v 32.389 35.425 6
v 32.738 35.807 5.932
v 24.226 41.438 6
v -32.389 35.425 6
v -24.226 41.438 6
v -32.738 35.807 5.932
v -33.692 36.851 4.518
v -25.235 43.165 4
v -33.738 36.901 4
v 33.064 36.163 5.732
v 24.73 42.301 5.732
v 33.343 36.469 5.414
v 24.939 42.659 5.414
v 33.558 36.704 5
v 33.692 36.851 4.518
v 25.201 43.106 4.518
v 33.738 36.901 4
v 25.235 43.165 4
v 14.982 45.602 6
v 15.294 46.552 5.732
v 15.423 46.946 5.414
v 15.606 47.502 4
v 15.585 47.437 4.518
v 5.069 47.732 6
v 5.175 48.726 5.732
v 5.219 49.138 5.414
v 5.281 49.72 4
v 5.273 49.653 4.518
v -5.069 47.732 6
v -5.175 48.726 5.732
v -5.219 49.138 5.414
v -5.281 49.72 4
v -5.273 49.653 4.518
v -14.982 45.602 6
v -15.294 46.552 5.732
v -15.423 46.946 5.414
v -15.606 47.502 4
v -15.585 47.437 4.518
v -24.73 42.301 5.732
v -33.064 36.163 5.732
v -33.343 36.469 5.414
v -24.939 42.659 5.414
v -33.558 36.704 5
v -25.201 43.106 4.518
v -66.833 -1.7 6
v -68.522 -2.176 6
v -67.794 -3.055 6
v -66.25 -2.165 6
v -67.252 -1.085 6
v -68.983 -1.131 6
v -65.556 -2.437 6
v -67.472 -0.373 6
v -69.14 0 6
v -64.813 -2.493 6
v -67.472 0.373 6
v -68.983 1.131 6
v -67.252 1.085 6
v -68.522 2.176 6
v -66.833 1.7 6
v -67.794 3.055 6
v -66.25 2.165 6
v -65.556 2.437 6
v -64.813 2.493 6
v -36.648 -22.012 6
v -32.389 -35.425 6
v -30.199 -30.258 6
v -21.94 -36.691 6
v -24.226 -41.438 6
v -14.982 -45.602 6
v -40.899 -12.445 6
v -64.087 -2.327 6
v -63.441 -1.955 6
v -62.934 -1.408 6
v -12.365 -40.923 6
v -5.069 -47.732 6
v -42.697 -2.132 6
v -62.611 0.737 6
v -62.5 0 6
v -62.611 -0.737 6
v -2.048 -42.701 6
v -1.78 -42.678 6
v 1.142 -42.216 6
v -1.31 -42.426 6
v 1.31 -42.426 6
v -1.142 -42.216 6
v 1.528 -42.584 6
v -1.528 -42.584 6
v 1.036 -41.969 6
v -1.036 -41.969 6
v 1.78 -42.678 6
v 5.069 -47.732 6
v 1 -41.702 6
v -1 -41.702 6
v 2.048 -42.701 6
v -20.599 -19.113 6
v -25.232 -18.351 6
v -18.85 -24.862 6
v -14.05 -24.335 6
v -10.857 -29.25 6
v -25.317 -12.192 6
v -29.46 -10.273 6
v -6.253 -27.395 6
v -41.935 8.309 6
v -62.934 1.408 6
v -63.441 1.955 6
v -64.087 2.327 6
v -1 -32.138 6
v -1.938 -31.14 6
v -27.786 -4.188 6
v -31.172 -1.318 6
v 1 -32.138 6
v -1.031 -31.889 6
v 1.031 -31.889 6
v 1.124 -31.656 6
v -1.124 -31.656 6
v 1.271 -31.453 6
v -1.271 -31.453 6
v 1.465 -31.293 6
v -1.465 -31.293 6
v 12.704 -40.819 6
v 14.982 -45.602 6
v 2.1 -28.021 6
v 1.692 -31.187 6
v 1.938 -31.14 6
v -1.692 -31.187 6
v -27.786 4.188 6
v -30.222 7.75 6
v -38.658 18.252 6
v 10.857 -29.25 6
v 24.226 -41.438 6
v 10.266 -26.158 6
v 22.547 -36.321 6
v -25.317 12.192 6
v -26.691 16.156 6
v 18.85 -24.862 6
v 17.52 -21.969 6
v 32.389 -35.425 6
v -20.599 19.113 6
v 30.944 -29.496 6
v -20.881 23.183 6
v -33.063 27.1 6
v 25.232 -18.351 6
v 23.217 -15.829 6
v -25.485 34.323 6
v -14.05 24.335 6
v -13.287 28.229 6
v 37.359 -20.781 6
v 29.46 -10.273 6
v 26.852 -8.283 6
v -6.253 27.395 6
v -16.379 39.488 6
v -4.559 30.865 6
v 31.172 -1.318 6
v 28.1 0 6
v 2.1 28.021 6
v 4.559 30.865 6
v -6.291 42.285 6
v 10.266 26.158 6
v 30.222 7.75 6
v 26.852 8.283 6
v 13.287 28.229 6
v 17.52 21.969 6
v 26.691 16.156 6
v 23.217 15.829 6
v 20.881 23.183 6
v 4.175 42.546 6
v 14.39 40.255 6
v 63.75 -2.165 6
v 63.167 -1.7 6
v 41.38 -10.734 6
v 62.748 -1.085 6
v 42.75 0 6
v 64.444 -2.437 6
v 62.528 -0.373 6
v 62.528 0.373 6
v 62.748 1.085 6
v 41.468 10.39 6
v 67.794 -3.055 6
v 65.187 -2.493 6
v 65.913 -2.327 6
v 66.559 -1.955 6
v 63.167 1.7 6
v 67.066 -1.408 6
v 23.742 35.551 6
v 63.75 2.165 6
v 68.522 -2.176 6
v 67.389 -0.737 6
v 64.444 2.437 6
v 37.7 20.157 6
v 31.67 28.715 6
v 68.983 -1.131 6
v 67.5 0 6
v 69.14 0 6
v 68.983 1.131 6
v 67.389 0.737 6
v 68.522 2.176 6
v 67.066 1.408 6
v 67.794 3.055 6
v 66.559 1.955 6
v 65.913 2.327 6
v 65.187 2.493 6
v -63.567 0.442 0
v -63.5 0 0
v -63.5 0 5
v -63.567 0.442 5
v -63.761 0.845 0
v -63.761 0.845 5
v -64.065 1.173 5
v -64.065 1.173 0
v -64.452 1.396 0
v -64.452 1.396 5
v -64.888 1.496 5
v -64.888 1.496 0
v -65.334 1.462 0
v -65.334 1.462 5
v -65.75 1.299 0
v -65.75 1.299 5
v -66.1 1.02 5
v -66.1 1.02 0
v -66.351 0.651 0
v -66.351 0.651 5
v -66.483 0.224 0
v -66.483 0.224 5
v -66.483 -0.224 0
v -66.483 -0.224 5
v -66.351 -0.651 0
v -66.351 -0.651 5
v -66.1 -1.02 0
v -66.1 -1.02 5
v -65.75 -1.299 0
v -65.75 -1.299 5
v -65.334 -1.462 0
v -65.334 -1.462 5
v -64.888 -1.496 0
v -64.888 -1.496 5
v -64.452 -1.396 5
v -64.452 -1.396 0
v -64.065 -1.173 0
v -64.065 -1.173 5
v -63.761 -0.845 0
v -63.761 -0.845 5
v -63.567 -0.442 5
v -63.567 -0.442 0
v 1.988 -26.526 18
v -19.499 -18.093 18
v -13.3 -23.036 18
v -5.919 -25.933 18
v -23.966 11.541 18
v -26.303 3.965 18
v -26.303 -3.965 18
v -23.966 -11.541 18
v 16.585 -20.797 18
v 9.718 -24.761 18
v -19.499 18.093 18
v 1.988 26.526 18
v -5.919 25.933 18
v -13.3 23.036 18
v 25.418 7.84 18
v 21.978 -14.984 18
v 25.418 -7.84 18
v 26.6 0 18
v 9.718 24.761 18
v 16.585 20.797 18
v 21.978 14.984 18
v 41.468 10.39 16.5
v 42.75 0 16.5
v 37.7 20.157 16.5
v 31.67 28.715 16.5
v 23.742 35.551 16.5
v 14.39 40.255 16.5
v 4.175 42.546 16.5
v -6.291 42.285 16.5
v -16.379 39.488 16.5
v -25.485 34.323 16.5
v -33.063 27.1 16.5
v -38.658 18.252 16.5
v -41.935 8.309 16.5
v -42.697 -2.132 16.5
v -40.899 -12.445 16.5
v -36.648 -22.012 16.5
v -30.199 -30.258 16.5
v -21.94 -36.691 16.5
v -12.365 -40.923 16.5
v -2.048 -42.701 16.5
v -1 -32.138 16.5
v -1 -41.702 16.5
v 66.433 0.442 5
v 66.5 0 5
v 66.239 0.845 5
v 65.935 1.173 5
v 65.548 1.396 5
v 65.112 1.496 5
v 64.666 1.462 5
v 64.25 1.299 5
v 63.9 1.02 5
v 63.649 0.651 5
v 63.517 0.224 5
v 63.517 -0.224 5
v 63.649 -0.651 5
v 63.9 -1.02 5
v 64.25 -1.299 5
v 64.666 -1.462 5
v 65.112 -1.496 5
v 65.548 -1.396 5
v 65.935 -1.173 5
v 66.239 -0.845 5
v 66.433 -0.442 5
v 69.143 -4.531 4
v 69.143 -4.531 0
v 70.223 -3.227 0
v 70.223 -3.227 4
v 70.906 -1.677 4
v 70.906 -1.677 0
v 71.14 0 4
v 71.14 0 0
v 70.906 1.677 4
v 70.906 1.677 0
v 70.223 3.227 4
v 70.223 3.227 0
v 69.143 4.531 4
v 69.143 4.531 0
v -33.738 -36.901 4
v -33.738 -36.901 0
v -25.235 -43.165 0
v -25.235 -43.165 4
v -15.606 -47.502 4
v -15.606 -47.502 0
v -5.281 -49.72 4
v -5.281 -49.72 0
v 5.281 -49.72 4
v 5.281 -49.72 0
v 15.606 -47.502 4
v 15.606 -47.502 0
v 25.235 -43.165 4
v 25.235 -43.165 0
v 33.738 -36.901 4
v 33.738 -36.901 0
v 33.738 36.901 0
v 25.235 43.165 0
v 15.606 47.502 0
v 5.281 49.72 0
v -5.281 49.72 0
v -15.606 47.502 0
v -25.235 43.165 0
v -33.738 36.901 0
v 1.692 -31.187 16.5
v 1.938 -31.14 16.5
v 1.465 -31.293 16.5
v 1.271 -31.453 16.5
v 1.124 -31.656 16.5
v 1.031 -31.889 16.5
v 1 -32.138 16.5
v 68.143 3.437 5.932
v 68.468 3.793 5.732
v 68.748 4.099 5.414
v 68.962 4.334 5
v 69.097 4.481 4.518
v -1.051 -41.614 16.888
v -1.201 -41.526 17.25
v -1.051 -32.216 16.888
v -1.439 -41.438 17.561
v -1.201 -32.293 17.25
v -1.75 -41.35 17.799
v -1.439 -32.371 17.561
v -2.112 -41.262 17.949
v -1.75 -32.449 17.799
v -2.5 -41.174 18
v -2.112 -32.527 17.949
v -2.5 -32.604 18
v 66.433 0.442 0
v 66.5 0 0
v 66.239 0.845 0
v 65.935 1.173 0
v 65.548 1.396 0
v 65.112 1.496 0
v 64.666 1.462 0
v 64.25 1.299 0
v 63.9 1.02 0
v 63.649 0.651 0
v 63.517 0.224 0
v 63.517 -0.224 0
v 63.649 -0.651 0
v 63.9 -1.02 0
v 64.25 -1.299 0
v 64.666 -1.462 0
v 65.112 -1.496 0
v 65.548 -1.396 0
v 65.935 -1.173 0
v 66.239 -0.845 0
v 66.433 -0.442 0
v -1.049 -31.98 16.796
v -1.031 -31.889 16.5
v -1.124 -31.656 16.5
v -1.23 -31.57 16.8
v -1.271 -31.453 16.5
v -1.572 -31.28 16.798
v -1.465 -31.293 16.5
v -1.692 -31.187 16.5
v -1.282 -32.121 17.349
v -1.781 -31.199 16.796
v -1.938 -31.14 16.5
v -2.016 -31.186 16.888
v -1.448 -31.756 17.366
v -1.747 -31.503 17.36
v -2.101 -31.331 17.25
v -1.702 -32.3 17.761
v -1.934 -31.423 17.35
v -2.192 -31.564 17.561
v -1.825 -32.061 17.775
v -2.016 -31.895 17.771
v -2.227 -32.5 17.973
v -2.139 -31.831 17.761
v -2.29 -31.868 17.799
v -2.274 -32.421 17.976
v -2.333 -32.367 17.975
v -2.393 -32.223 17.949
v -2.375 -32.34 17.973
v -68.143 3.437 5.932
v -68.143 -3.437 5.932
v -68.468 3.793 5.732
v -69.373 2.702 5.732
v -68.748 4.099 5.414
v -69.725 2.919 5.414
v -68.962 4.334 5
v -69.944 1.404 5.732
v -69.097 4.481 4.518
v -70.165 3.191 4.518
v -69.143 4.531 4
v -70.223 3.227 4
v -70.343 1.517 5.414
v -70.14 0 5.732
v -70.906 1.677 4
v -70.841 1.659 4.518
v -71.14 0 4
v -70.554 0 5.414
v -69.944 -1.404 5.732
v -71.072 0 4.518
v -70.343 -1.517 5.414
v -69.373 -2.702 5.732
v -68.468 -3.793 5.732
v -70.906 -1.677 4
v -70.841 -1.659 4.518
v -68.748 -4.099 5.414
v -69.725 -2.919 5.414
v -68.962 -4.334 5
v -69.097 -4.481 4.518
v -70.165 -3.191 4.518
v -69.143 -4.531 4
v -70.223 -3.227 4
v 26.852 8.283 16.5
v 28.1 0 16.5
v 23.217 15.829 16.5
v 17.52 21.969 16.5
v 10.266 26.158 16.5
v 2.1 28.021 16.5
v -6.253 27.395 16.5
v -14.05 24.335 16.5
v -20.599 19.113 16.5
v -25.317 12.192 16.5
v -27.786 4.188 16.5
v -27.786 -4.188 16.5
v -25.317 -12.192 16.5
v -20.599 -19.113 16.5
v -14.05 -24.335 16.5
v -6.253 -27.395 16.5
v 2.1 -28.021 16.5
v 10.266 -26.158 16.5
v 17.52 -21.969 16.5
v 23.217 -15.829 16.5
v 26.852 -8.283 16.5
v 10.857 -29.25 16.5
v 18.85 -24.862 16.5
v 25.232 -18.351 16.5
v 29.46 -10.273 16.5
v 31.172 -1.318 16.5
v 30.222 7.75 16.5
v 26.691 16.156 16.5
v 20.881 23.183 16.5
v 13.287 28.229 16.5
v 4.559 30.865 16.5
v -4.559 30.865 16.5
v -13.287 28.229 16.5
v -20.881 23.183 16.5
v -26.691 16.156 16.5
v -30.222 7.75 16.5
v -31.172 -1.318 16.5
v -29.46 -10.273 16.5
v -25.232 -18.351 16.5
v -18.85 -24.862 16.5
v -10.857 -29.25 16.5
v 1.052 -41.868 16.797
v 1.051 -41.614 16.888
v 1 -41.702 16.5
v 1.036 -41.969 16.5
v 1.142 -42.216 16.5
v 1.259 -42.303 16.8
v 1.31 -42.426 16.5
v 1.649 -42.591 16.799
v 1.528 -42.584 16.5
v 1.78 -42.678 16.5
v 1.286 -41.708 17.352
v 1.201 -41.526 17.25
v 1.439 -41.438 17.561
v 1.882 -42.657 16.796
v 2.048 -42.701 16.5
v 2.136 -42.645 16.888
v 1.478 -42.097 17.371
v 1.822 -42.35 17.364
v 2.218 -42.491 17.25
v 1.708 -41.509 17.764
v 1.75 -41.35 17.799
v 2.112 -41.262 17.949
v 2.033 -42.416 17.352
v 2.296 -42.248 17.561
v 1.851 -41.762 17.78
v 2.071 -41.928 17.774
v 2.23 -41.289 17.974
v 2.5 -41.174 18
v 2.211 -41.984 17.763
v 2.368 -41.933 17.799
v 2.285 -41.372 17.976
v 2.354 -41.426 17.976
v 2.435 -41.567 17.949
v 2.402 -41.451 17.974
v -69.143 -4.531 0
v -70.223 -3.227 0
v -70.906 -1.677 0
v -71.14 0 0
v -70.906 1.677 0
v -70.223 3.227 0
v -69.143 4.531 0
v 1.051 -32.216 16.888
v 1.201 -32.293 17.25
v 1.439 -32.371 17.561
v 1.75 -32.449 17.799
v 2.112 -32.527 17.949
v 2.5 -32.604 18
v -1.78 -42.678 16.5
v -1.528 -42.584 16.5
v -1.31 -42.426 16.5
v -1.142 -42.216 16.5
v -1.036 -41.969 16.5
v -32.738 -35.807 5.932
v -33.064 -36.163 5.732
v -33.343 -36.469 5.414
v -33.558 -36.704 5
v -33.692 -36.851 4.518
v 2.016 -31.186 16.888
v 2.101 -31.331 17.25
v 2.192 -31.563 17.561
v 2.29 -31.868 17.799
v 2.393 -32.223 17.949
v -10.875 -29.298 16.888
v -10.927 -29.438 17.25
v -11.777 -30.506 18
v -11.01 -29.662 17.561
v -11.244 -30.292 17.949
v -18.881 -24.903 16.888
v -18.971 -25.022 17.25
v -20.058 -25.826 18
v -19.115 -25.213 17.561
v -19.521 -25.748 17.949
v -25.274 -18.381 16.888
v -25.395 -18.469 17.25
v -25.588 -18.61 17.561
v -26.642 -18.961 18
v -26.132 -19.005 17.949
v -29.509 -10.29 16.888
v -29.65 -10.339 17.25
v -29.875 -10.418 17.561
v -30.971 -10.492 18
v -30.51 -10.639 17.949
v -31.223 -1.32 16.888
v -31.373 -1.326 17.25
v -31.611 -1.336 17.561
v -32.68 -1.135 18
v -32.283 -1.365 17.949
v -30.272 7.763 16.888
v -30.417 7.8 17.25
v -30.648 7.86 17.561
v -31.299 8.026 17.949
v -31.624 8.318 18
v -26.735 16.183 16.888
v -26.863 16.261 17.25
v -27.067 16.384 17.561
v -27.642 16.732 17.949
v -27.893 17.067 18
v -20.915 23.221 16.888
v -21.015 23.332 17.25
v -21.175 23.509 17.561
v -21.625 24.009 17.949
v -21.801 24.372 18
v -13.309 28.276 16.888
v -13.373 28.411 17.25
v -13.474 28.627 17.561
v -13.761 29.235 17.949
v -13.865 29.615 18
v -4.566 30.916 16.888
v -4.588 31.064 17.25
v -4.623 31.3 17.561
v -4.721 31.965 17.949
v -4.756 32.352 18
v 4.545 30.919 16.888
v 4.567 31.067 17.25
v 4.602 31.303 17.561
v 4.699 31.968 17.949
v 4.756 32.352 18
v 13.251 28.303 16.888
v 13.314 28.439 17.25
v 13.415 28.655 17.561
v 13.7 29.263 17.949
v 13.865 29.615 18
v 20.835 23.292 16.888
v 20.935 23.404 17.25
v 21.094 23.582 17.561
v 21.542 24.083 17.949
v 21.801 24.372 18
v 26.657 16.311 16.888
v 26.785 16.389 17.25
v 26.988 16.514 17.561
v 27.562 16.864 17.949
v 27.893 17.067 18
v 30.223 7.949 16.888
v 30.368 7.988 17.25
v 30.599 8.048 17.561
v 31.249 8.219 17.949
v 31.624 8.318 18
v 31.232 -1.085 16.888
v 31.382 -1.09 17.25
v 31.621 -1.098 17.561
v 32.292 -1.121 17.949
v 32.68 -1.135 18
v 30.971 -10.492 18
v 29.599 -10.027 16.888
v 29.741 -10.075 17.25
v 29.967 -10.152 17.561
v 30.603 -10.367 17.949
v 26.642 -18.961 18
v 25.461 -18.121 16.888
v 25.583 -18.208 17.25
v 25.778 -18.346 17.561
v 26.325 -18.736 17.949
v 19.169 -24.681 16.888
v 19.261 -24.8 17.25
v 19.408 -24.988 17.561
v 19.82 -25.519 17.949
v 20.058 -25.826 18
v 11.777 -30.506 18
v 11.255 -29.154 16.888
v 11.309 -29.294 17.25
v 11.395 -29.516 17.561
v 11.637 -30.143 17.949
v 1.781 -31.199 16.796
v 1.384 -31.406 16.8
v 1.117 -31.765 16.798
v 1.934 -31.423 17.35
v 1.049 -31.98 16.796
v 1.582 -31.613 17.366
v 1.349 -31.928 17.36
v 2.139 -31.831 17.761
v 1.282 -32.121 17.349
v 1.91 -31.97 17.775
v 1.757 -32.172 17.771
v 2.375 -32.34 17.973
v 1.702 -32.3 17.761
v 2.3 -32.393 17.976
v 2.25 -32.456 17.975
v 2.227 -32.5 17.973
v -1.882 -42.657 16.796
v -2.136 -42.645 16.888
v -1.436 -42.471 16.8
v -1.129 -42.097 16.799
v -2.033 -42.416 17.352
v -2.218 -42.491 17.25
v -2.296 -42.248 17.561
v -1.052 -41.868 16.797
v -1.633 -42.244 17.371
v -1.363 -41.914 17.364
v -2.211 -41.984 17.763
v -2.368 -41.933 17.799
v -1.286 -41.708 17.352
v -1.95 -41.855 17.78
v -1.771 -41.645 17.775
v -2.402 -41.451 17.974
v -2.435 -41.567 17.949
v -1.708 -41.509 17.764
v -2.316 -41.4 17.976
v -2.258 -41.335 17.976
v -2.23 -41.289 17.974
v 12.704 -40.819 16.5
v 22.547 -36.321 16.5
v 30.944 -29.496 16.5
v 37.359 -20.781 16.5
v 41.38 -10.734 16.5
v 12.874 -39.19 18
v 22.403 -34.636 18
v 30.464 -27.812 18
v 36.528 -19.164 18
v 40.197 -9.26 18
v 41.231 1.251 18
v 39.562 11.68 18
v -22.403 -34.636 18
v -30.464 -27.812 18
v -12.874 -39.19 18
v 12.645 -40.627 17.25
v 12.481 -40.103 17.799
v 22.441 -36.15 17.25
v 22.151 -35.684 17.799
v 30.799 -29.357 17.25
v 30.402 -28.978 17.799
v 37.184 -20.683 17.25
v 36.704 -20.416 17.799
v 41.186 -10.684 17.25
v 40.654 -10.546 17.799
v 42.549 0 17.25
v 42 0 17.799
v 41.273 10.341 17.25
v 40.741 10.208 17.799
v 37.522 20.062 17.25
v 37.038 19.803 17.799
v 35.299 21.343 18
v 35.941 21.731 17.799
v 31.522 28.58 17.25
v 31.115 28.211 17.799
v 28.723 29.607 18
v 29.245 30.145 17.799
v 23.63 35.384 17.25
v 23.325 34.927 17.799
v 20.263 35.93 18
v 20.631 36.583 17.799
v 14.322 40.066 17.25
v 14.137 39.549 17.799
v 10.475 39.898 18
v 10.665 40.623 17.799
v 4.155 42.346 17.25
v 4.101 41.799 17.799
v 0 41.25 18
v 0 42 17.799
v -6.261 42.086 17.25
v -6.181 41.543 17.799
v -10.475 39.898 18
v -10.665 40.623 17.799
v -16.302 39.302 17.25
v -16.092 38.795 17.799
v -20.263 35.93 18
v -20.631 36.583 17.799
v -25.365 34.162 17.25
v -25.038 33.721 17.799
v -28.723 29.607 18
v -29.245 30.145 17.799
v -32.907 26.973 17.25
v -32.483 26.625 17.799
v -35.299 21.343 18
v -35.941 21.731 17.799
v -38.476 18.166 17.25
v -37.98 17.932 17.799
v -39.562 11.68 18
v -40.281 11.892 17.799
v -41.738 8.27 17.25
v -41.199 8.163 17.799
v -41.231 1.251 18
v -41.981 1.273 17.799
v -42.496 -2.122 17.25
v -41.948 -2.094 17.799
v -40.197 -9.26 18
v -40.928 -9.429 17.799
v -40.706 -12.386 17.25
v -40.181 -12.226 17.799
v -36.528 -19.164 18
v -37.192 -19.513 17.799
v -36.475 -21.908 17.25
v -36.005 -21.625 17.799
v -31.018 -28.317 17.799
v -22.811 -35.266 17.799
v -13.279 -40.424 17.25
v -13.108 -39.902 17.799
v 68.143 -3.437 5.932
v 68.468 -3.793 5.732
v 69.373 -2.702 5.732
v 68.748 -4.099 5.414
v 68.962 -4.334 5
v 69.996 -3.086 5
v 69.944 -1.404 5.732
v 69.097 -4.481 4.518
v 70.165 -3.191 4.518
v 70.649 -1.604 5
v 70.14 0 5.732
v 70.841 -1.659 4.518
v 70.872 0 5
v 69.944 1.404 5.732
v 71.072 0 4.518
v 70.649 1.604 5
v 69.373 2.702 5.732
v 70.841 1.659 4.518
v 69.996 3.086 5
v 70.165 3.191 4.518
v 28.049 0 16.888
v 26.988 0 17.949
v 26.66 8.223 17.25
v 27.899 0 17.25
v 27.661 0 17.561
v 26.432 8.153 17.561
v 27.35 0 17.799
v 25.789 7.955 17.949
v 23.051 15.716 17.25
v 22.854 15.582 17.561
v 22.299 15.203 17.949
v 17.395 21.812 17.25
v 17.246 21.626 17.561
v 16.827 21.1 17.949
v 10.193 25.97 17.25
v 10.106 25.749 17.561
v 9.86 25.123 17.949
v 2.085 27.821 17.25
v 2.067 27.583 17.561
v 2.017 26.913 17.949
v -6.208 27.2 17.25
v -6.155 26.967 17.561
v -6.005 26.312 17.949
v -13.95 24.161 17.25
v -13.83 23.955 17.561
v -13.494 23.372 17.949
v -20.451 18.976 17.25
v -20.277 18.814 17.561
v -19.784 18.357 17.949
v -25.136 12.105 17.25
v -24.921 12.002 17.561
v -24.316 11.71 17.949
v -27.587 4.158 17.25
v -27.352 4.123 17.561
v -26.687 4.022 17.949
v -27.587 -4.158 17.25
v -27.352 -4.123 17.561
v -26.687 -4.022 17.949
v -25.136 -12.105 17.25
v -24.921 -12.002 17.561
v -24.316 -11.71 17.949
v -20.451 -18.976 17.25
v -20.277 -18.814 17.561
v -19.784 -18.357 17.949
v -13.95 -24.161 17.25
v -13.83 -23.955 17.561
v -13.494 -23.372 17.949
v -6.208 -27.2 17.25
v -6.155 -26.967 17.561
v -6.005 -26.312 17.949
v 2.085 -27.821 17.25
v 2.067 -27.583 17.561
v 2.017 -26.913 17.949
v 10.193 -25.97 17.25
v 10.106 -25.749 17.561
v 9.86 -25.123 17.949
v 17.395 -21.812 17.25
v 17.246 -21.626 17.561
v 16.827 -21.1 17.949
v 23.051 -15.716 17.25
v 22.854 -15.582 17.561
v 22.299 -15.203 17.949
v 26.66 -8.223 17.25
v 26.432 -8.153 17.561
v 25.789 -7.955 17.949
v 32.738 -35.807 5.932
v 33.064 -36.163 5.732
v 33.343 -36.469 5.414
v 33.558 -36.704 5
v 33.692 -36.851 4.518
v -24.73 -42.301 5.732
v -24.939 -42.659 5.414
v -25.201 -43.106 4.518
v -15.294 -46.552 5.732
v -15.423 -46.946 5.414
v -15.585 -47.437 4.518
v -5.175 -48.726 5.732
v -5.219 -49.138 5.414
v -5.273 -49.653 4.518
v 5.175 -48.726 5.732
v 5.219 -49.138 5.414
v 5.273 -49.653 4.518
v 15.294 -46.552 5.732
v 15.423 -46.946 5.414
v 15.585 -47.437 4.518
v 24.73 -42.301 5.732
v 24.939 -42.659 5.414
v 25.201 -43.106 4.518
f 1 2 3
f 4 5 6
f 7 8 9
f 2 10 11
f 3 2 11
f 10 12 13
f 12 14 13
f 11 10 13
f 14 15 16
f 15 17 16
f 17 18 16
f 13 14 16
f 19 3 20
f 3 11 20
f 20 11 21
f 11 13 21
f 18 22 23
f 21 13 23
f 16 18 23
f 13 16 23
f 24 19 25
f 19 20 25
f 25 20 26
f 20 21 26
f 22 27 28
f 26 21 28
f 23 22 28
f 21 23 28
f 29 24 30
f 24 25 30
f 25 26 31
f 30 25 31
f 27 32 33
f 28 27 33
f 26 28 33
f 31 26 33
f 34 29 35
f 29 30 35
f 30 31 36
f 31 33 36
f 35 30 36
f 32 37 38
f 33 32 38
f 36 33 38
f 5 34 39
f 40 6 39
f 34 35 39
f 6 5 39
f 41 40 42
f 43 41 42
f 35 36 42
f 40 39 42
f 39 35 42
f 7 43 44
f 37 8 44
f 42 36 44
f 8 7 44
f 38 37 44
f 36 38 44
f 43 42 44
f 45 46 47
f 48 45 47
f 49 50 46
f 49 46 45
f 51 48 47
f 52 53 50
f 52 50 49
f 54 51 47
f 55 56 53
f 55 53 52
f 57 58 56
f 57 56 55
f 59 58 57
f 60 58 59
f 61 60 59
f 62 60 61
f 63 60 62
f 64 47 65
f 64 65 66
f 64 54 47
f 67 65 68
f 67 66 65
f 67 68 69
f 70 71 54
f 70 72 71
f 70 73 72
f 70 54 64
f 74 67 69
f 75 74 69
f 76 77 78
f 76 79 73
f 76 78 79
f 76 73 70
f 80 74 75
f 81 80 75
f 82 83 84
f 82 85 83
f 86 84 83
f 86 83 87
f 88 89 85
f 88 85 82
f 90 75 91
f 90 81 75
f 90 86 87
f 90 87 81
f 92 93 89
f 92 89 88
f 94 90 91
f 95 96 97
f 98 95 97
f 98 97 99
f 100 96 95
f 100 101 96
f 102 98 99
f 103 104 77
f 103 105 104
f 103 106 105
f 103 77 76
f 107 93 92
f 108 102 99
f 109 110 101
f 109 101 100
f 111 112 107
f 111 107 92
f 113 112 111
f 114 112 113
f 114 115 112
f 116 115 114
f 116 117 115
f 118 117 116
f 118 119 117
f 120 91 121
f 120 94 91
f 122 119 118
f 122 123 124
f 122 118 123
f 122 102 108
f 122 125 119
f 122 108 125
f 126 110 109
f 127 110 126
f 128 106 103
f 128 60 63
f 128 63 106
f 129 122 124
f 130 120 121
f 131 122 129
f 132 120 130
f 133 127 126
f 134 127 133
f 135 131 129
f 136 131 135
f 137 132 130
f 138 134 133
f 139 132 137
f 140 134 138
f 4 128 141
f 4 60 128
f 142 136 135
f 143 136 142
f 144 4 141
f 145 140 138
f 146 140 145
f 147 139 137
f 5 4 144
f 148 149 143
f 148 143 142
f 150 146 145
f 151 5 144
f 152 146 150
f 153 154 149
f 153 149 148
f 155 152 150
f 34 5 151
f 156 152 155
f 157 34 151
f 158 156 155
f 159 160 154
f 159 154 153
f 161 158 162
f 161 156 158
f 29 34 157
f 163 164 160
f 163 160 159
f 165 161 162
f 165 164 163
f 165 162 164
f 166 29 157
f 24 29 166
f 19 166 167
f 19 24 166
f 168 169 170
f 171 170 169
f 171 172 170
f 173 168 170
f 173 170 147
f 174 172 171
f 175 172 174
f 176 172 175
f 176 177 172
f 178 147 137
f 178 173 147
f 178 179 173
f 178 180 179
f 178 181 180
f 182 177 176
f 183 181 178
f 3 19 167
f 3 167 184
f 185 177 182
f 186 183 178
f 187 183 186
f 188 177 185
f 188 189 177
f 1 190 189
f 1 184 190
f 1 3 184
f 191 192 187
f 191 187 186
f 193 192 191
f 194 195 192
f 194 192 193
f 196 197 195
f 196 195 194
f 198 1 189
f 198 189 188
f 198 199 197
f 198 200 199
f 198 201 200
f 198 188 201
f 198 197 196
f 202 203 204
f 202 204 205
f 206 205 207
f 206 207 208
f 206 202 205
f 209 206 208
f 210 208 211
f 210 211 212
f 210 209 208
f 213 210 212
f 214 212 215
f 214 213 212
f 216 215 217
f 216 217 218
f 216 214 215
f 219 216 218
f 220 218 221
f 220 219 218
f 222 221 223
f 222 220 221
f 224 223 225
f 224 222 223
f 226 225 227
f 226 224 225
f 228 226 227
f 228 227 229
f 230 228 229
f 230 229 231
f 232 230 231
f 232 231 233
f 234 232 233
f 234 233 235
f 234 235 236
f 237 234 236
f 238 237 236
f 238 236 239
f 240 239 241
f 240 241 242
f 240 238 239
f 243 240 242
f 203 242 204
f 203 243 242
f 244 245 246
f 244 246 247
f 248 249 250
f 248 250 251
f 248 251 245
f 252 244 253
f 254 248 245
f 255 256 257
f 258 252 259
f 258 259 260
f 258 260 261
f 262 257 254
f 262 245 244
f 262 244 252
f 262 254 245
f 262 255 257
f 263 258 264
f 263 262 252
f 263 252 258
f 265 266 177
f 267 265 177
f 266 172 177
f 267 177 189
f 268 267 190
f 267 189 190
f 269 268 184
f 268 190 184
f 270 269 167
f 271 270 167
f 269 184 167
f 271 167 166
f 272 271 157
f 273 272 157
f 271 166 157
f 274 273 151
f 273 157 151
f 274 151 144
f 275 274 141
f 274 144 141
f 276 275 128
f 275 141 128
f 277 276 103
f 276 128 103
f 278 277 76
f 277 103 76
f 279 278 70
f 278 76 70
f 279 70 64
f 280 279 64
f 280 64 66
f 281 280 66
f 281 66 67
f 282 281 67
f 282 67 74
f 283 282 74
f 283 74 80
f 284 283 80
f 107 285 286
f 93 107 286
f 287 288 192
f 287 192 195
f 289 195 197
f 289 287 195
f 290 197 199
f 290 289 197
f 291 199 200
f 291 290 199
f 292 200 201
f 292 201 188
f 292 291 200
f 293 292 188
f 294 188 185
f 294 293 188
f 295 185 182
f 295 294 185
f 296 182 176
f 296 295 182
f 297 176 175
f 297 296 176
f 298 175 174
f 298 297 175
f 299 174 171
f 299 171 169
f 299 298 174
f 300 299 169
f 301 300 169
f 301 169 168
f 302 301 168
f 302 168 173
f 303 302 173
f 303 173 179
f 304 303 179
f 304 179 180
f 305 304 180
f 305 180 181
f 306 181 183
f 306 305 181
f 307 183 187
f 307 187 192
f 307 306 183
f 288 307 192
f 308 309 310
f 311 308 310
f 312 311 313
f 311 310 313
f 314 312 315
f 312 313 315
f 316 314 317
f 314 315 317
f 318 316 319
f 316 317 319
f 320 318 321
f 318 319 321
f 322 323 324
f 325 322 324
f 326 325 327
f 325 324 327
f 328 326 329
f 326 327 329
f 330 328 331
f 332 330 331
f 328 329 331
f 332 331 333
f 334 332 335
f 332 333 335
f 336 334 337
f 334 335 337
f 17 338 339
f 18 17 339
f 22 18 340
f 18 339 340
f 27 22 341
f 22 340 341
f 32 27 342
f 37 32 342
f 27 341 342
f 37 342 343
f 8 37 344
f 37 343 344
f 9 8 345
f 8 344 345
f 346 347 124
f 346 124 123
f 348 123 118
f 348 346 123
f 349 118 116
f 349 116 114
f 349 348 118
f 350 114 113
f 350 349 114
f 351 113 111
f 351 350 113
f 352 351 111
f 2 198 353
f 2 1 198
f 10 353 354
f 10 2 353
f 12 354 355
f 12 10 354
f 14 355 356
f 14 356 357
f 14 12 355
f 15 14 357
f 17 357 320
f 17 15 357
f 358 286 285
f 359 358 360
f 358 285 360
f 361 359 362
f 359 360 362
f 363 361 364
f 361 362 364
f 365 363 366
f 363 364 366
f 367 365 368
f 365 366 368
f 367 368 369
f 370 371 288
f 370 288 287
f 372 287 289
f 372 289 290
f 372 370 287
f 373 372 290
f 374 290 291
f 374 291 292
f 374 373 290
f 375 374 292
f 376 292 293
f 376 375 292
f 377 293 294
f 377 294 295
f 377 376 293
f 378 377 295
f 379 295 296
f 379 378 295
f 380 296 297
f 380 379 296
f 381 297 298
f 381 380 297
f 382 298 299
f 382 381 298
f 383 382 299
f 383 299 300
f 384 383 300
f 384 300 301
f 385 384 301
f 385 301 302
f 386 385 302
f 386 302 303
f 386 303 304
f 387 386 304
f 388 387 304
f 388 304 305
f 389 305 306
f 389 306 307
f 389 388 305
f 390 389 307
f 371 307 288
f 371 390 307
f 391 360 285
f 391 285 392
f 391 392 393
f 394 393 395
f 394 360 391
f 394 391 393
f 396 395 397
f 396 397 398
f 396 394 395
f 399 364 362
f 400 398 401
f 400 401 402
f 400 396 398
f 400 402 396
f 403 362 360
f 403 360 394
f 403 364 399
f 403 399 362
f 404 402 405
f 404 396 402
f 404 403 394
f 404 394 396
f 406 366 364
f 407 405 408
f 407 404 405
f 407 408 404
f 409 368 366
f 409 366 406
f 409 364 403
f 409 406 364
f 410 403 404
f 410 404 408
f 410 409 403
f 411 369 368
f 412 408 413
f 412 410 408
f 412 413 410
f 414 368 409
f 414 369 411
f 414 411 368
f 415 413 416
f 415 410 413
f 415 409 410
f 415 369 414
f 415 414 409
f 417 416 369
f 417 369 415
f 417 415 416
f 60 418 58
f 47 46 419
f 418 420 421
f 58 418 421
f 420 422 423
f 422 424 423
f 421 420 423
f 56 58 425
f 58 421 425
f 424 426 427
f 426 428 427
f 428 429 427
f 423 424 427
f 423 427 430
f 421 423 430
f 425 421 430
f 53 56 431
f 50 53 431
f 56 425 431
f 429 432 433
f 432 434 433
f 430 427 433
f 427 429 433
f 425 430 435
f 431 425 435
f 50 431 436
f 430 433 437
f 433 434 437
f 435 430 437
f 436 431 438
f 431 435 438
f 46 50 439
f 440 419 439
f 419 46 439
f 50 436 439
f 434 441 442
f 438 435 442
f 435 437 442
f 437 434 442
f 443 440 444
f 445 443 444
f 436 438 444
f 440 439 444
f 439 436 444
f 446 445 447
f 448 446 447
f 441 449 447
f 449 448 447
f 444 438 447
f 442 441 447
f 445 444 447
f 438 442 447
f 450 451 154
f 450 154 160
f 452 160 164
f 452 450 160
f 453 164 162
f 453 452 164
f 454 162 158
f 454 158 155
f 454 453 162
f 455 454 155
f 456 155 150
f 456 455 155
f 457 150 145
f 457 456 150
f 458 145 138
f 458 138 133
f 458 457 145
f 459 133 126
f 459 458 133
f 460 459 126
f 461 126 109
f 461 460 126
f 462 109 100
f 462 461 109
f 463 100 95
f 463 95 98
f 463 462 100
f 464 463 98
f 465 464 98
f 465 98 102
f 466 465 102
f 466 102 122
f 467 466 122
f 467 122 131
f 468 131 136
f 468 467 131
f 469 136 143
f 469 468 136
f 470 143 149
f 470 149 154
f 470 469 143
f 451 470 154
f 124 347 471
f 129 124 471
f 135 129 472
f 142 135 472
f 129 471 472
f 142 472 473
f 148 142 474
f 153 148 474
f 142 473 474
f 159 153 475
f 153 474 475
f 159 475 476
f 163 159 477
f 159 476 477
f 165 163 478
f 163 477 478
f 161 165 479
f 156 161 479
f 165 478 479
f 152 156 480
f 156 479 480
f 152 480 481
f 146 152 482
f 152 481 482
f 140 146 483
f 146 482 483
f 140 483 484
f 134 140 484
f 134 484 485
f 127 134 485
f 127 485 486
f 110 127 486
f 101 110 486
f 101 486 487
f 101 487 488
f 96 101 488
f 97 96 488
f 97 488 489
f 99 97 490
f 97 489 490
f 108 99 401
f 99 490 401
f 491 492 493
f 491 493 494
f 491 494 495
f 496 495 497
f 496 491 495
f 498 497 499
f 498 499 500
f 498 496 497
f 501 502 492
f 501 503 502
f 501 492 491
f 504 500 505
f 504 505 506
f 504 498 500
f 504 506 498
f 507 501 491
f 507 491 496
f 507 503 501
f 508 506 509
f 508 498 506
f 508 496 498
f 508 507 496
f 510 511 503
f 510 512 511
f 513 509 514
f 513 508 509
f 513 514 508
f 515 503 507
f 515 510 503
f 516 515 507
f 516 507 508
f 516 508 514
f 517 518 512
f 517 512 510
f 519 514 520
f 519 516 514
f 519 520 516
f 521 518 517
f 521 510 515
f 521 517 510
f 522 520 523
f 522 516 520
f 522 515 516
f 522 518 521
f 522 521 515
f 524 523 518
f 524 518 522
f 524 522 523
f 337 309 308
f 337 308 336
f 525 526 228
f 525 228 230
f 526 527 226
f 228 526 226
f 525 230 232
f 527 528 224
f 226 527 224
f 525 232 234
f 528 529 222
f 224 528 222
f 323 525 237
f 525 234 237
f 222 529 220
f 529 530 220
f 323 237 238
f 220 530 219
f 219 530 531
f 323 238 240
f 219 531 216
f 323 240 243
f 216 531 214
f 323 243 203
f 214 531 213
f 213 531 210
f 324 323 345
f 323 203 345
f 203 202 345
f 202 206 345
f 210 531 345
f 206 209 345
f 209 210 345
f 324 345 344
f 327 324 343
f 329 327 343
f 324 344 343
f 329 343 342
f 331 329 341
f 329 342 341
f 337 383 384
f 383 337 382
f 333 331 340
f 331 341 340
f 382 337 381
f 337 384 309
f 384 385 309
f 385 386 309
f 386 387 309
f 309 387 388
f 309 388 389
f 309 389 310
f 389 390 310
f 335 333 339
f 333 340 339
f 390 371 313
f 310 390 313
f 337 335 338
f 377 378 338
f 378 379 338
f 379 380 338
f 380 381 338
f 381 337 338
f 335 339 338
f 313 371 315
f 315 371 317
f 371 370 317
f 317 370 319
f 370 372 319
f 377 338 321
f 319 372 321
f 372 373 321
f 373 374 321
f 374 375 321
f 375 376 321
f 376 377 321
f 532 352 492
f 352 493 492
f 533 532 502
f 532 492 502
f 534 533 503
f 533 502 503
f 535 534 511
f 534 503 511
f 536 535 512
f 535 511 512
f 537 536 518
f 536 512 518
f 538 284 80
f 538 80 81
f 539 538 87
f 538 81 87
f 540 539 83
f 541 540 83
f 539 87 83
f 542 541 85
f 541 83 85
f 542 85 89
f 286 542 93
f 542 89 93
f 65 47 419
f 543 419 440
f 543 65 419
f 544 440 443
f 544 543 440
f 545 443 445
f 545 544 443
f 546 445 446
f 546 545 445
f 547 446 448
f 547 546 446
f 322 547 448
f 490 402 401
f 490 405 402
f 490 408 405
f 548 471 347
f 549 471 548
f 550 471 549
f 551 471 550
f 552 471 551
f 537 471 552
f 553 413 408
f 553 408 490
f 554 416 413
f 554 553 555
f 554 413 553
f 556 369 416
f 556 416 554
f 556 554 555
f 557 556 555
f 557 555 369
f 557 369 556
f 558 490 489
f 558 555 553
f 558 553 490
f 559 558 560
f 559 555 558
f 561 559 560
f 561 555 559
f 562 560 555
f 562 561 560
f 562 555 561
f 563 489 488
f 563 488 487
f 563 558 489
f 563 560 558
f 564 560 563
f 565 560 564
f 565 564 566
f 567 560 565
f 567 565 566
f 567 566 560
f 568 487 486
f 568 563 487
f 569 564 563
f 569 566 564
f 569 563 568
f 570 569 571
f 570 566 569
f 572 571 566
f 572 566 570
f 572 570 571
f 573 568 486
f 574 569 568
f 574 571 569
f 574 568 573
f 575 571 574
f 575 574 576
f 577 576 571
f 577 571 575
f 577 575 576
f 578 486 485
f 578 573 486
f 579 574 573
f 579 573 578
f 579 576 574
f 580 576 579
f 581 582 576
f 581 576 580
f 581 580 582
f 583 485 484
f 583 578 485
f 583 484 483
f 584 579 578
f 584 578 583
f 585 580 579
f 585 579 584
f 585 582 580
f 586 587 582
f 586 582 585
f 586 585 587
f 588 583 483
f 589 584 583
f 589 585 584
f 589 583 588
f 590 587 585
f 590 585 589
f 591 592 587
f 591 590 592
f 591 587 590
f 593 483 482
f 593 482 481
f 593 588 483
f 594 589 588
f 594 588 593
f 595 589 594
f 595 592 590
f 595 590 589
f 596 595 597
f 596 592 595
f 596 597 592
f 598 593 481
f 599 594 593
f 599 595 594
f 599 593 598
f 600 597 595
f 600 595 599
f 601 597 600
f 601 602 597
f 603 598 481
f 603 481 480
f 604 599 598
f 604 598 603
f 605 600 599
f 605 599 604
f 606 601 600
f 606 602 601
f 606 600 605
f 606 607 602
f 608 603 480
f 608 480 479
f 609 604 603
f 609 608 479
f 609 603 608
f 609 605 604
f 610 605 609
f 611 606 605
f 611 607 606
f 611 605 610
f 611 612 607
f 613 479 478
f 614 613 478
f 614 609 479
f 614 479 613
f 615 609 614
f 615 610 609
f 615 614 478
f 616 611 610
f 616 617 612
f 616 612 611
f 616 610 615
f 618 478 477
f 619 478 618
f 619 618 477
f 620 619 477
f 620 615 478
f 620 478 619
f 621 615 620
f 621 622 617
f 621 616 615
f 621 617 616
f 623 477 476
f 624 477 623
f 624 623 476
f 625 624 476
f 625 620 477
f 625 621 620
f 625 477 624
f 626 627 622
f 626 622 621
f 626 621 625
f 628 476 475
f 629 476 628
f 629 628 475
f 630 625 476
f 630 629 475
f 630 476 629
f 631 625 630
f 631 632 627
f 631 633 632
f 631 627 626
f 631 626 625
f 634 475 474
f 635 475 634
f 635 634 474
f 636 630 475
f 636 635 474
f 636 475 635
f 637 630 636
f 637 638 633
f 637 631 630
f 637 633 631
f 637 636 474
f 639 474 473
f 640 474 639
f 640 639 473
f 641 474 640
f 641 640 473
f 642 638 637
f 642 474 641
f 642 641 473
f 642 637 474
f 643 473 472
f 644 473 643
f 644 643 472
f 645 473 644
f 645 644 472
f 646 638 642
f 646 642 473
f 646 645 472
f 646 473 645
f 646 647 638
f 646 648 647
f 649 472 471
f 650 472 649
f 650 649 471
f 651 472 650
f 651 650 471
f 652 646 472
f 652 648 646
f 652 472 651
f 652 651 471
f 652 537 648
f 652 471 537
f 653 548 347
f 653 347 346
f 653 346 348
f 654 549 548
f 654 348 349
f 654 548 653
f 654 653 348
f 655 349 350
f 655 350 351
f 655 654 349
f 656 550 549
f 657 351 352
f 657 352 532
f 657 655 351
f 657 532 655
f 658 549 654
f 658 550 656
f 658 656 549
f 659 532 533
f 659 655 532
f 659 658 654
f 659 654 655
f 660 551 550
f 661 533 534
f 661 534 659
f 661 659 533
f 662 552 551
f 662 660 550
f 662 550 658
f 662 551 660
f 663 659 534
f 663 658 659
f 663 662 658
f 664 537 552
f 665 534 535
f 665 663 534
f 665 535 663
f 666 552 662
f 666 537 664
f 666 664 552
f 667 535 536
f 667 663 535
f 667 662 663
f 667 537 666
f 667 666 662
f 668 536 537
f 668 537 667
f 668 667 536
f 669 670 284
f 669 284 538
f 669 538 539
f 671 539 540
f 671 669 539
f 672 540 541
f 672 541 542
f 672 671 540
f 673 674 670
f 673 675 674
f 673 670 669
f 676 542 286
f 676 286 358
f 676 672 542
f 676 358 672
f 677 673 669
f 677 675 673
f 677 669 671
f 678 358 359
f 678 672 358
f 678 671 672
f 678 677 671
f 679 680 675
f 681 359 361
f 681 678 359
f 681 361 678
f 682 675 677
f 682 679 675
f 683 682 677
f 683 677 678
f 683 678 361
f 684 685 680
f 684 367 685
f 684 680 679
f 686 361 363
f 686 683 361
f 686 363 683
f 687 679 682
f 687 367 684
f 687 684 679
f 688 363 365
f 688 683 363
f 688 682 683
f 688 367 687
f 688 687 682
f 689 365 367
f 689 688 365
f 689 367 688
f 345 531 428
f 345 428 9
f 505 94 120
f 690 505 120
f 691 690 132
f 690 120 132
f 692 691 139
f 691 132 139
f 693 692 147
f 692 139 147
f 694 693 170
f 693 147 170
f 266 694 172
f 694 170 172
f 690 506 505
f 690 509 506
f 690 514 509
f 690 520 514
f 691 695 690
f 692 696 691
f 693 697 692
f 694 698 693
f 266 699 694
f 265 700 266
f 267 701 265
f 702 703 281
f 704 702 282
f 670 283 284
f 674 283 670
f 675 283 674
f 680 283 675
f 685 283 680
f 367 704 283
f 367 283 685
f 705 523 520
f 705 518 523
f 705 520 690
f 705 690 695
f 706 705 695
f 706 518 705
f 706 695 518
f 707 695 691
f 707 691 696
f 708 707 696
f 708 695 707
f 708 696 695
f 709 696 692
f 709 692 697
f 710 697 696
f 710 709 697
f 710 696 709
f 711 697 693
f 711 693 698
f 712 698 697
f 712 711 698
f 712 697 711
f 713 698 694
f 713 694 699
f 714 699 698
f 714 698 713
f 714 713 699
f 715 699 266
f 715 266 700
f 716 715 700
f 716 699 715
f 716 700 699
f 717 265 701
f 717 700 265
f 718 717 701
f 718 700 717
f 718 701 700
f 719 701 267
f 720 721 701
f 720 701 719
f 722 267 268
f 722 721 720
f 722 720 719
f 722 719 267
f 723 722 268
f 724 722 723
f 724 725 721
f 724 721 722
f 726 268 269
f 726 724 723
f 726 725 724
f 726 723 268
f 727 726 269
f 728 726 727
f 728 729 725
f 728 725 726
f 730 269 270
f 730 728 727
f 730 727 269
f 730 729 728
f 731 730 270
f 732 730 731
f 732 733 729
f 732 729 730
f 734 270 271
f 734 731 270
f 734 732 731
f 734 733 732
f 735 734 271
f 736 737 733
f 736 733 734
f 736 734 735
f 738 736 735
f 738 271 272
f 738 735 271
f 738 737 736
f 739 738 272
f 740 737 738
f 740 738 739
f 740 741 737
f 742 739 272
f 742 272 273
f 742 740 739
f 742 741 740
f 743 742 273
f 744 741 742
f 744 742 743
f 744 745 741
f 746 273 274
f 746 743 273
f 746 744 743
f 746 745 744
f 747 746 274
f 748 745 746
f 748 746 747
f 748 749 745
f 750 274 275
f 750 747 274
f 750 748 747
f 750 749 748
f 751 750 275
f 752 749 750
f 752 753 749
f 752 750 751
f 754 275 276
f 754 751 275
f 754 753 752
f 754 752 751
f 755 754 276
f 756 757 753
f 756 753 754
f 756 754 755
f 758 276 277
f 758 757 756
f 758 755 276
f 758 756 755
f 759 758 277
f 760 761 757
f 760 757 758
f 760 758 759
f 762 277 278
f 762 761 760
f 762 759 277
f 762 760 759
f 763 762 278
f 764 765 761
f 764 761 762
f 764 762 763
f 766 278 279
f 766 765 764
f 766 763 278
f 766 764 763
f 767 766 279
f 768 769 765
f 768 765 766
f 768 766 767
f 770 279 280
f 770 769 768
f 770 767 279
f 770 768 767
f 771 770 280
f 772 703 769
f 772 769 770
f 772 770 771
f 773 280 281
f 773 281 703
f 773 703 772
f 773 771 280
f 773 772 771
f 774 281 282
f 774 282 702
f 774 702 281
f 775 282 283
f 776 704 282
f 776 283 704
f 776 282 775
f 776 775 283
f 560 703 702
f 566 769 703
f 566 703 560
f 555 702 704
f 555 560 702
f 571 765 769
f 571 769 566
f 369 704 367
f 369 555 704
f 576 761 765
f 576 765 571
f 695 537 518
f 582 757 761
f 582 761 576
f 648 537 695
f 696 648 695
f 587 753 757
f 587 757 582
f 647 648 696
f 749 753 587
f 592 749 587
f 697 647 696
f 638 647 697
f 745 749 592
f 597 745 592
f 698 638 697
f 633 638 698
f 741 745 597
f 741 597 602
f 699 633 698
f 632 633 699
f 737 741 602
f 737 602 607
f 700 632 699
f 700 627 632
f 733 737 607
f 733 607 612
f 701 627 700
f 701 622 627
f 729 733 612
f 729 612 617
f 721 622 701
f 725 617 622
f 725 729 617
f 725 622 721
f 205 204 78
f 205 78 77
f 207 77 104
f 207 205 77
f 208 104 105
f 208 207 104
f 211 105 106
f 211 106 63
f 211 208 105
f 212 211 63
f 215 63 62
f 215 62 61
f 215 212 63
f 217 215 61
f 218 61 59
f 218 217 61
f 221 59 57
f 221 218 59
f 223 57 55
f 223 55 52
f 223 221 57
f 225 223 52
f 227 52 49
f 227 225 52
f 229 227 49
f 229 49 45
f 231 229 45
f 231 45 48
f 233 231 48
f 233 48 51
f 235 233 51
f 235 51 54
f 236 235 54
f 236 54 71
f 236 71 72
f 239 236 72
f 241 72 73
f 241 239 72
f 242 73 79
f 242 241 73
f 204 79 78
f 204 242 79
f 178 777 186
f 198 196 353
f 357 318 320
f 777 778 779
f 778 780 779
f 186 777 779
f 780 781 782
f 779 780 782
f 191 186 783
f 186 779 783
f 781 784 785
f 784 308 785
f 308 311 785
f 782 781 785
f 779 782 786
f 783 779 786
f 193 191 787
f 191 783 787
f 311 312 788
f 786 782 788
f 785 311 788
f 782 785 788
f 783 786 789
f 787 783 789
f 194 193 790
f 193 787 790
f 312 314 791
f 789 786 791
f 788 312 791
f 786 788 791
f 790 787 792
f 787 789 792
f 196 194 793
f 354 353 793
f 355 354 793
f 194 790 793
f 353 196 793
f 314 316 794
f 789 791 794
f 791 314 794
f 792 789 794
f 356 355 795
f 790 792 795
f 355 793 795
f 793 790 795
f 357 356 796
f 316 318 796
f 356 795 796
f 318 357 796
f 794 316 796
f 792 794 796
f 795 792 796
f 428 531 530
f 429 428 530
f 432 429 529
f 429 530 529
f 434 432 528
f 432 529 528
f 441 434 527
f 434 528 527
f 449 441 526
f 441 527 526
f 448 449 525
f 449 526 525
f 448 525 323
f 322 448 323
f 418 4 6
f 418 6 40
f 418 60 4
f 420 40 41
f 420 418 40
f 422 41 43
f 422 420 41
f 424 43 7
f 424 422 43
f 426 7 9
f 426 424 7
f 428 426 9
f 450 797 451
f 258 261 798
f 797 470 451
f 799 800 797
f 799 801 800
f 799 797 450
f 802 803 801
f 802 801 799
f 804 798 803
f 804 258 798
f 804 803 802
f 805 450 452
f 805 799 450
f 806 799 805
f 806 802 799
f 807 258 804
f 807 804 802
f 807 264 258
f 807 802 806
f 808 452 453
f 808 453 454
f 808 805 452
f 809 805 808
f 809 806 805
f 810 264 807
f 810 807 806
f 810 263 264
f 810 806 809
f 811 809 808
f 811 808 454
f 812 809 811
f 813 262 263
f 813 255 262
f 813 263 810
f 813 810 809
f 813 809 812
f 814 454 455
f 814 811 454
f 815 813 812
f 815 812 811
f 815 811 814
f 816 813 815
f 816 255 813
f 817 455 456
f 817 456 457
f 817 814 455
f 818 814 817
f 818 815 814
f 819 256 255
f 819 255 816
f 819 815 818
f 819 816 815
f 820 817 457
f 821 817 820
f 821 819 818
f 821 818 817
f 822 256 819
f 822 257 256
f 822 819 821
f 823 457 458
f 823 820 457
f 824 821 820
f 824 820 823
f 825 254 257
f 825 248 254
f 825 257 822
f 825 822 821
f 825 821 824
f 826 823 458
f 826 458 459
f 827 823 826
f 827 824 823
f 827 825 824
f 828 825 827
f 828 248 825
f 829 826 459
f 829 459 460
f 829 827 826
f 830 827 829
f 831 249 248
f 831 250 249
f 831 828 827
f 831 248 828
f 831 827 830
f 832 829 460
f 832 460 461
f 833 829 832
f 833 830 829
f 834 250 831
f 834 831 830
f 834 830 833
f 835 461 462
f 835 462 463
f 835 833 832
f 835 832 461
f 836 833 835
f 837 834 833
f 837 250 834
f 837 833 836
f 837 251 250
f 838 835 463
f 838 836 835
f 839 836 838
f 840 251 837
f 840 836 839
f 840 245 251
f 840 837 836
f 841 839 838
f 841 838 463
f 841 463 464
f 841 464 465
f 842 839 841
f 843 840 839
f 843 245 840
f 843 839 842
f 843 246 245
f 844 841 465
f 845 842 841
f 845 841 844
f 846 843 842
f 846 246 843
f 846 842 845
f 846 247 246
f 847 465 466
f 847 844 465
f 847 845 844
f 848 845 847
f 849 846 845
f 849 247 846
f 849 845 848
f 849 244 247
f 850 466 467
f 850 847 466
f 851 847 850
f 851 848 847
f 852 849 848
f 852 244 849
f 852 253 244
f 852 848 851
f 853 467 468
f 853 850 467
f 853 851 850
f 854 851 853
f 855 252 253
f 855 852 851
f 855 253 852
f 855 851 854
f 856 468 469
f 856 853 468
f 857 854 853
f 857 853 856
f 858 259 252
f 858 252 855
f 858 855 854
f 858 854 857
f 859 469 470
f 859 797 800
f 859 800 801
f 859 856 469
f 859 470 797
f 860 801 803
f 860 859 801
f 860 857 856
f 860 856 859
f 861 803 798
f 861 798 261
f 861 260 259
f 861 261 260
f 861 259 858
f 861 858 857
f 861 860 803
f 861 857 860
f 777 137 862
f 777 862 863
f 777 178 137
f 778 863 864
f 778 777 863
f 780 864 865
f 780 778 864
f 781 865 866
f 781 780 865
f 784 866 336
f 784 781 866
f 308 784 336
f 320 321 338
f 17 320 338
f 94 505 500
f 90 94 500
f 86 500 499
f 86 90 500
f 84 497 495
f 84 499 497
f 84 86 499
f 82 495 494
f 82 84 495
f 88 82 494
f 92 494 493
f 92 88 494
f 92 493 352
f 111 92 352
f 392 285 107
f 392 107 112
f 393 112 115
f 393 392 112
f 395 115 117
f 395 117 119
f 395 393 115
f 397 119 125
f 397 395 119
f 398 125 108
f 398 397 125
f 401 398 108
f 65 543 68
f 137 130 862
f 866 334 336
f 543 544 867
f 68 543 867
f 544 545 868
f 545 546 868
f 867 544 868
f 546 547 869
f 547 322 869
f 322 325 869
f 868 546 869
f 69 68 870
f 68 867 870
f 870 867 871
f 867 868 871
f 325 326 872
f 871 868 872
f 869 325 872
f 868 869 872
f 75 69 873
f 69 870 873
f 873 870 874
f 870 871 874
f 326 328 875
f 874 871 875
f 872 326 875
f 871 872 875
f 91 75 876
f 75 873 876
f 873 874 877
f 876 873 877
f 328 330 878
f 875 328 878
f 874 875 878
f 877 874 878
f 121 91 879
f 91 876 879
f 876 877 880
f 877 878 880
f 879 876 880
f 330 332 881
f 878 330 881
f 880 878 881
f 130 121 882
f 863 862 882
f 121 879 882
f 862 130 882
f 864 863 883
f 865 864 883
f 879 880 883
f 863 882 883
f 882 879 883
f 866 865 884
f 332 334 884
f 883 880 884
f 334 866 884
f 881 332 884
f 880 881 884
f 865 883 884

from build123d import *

# Parameters (mm, degrees)
SKETCH_R     = 1.5
PAD_DEPTH    = 6
SKETCH001_R  = 42.75
PAD001_DEPTH = 12
SKETCH002_R  = 28.1
POCKET_DEPTH = 12
CHAMFER_SIZE = 1
FILLET_R     = 2
FILLET001_R  = 1
FILLET002_R  = 1.5
FILLET003_R  = 1.5


with BuildPart() as part:
    # Sketch → Pad (new body)
    with BuildSketch(Plane.XY):
        with BuildLine():
            ThreePointArc((-33.738462, -36.901439), (0, -50), (33.738462, -36.901439))
            Line((69.143083, -4.531497), (33.738462, -36.901439))
            ThreePointArc((69.143083, -4.531497), (71.14, 0), (69.143083, 4.531497))
            Line((69.143083, 4.531497), (33.738462, 36.901439))
            ThreePointArc((33.738462, 36.901439), (0, 50), (-33.738462, 36.901439))
            Line((-69.143083, 4.531497), (-33.738462, 36.901439))
            ThreePointArc((-69.143083, 4.531497), (-71.14, 0), (-69.143083, -4.531497))
            Line((-69.143083, -4.531497), (-33.738462, -36.901439))
        make_face()
        with Locations((-65, 0)):
            Circle(SKETCH_R, mode=Mode.SUBTRACT)
        with Locations((65, 0)):
            Circle(SKETCH_R, mode=Mode.SUBTRACT)
    extrude(amount=PAD_DEPTH)

    # Sketch001 (on Face12 of Pad) → Pad001 (join)
    with BuildSketch(Plane.XY.offset(6)):
        Circle(SKETCH001_R)
    extrude(amount=PAD001_DEPTH)

    # Sketch002 (on Face14 of Pad001) → Pocket (cut)
    with BuildSketch(Plane.XY.offset(18)):
        with BuildLine():
            ThreePointArc((1.937888, -31.139759), (0, 31.2), (-1.937888, -31.139759))
            ThreePointArc((-1, -32.137828), (-1.271264, -31.453033), (-1.937888, -31.139759))
            Line((-1, -32.137828), (-1, -43.137828))
            Line((-1, -43.137828), (1, -43.137828))
            Line((1, -43.137828), (1, -32.137828))
            ThreePointArc((1.937888, -31.139759), (1.271264, -31.453033), (1, -32.137828))
        make_face()
        Circle(SKETCH002_R, mode=Mode.SUBTRACT)
    extrude(amount=-POCKET_DEPTH, mode=Mode.SUBTRACT)

    # Chamfer
    chamfer_edges = [part.edges().sort_by_distance(p)[0] for p in [
        (-66.5, 0, 6),
        (63.5, 0, 6),
    ]]
    chamfer(chamfer_edges, length=CHAMFER_SIZE)

    # Fillet
    fillet_edges = [part.edges().sort_by_distance(p)[0] for p in [
        (51.440772, 20.716468, 6),
        (71.14, 0, 6),
        (51.440772, -20.716468, 6),
        (0, 50, 6),
        (-51.440772, 20.716468, 6),
        (-71.14, 0, 6),
        (-51.440772, -20.716468, 6),
        (0, -50, 6),
    ]]
    fillet(fillet_edges, radius=FILLET_R)

    # Fillet001
    fillet001_edges = [part.edges().sort_by_distance(p)[0] for p in [
        (1, -42.738302, 12),
        (-1, -42.738302, 12),
    ]]
    fillet(fillet001_edges, radius=FILLET001_R)

    # Fillet002
    fillet002_edges = [part.edges().sort_by_distance(p)[0] for p in [
        (30.944389, -29.495886, 18),
        (-29.495886, 30.944389, 18),
    ]]
    fillet(fillet002_edges, radius=FILLET002_R)

    # Fillet003
    fillet003_edges = [part.edges().sort_by_distance(p)[0] for p in [
        (-28.1, 0, 18),
    ]]
    fillet(fillet003_edges, radius=FILLET003_R)


solid = part.part
